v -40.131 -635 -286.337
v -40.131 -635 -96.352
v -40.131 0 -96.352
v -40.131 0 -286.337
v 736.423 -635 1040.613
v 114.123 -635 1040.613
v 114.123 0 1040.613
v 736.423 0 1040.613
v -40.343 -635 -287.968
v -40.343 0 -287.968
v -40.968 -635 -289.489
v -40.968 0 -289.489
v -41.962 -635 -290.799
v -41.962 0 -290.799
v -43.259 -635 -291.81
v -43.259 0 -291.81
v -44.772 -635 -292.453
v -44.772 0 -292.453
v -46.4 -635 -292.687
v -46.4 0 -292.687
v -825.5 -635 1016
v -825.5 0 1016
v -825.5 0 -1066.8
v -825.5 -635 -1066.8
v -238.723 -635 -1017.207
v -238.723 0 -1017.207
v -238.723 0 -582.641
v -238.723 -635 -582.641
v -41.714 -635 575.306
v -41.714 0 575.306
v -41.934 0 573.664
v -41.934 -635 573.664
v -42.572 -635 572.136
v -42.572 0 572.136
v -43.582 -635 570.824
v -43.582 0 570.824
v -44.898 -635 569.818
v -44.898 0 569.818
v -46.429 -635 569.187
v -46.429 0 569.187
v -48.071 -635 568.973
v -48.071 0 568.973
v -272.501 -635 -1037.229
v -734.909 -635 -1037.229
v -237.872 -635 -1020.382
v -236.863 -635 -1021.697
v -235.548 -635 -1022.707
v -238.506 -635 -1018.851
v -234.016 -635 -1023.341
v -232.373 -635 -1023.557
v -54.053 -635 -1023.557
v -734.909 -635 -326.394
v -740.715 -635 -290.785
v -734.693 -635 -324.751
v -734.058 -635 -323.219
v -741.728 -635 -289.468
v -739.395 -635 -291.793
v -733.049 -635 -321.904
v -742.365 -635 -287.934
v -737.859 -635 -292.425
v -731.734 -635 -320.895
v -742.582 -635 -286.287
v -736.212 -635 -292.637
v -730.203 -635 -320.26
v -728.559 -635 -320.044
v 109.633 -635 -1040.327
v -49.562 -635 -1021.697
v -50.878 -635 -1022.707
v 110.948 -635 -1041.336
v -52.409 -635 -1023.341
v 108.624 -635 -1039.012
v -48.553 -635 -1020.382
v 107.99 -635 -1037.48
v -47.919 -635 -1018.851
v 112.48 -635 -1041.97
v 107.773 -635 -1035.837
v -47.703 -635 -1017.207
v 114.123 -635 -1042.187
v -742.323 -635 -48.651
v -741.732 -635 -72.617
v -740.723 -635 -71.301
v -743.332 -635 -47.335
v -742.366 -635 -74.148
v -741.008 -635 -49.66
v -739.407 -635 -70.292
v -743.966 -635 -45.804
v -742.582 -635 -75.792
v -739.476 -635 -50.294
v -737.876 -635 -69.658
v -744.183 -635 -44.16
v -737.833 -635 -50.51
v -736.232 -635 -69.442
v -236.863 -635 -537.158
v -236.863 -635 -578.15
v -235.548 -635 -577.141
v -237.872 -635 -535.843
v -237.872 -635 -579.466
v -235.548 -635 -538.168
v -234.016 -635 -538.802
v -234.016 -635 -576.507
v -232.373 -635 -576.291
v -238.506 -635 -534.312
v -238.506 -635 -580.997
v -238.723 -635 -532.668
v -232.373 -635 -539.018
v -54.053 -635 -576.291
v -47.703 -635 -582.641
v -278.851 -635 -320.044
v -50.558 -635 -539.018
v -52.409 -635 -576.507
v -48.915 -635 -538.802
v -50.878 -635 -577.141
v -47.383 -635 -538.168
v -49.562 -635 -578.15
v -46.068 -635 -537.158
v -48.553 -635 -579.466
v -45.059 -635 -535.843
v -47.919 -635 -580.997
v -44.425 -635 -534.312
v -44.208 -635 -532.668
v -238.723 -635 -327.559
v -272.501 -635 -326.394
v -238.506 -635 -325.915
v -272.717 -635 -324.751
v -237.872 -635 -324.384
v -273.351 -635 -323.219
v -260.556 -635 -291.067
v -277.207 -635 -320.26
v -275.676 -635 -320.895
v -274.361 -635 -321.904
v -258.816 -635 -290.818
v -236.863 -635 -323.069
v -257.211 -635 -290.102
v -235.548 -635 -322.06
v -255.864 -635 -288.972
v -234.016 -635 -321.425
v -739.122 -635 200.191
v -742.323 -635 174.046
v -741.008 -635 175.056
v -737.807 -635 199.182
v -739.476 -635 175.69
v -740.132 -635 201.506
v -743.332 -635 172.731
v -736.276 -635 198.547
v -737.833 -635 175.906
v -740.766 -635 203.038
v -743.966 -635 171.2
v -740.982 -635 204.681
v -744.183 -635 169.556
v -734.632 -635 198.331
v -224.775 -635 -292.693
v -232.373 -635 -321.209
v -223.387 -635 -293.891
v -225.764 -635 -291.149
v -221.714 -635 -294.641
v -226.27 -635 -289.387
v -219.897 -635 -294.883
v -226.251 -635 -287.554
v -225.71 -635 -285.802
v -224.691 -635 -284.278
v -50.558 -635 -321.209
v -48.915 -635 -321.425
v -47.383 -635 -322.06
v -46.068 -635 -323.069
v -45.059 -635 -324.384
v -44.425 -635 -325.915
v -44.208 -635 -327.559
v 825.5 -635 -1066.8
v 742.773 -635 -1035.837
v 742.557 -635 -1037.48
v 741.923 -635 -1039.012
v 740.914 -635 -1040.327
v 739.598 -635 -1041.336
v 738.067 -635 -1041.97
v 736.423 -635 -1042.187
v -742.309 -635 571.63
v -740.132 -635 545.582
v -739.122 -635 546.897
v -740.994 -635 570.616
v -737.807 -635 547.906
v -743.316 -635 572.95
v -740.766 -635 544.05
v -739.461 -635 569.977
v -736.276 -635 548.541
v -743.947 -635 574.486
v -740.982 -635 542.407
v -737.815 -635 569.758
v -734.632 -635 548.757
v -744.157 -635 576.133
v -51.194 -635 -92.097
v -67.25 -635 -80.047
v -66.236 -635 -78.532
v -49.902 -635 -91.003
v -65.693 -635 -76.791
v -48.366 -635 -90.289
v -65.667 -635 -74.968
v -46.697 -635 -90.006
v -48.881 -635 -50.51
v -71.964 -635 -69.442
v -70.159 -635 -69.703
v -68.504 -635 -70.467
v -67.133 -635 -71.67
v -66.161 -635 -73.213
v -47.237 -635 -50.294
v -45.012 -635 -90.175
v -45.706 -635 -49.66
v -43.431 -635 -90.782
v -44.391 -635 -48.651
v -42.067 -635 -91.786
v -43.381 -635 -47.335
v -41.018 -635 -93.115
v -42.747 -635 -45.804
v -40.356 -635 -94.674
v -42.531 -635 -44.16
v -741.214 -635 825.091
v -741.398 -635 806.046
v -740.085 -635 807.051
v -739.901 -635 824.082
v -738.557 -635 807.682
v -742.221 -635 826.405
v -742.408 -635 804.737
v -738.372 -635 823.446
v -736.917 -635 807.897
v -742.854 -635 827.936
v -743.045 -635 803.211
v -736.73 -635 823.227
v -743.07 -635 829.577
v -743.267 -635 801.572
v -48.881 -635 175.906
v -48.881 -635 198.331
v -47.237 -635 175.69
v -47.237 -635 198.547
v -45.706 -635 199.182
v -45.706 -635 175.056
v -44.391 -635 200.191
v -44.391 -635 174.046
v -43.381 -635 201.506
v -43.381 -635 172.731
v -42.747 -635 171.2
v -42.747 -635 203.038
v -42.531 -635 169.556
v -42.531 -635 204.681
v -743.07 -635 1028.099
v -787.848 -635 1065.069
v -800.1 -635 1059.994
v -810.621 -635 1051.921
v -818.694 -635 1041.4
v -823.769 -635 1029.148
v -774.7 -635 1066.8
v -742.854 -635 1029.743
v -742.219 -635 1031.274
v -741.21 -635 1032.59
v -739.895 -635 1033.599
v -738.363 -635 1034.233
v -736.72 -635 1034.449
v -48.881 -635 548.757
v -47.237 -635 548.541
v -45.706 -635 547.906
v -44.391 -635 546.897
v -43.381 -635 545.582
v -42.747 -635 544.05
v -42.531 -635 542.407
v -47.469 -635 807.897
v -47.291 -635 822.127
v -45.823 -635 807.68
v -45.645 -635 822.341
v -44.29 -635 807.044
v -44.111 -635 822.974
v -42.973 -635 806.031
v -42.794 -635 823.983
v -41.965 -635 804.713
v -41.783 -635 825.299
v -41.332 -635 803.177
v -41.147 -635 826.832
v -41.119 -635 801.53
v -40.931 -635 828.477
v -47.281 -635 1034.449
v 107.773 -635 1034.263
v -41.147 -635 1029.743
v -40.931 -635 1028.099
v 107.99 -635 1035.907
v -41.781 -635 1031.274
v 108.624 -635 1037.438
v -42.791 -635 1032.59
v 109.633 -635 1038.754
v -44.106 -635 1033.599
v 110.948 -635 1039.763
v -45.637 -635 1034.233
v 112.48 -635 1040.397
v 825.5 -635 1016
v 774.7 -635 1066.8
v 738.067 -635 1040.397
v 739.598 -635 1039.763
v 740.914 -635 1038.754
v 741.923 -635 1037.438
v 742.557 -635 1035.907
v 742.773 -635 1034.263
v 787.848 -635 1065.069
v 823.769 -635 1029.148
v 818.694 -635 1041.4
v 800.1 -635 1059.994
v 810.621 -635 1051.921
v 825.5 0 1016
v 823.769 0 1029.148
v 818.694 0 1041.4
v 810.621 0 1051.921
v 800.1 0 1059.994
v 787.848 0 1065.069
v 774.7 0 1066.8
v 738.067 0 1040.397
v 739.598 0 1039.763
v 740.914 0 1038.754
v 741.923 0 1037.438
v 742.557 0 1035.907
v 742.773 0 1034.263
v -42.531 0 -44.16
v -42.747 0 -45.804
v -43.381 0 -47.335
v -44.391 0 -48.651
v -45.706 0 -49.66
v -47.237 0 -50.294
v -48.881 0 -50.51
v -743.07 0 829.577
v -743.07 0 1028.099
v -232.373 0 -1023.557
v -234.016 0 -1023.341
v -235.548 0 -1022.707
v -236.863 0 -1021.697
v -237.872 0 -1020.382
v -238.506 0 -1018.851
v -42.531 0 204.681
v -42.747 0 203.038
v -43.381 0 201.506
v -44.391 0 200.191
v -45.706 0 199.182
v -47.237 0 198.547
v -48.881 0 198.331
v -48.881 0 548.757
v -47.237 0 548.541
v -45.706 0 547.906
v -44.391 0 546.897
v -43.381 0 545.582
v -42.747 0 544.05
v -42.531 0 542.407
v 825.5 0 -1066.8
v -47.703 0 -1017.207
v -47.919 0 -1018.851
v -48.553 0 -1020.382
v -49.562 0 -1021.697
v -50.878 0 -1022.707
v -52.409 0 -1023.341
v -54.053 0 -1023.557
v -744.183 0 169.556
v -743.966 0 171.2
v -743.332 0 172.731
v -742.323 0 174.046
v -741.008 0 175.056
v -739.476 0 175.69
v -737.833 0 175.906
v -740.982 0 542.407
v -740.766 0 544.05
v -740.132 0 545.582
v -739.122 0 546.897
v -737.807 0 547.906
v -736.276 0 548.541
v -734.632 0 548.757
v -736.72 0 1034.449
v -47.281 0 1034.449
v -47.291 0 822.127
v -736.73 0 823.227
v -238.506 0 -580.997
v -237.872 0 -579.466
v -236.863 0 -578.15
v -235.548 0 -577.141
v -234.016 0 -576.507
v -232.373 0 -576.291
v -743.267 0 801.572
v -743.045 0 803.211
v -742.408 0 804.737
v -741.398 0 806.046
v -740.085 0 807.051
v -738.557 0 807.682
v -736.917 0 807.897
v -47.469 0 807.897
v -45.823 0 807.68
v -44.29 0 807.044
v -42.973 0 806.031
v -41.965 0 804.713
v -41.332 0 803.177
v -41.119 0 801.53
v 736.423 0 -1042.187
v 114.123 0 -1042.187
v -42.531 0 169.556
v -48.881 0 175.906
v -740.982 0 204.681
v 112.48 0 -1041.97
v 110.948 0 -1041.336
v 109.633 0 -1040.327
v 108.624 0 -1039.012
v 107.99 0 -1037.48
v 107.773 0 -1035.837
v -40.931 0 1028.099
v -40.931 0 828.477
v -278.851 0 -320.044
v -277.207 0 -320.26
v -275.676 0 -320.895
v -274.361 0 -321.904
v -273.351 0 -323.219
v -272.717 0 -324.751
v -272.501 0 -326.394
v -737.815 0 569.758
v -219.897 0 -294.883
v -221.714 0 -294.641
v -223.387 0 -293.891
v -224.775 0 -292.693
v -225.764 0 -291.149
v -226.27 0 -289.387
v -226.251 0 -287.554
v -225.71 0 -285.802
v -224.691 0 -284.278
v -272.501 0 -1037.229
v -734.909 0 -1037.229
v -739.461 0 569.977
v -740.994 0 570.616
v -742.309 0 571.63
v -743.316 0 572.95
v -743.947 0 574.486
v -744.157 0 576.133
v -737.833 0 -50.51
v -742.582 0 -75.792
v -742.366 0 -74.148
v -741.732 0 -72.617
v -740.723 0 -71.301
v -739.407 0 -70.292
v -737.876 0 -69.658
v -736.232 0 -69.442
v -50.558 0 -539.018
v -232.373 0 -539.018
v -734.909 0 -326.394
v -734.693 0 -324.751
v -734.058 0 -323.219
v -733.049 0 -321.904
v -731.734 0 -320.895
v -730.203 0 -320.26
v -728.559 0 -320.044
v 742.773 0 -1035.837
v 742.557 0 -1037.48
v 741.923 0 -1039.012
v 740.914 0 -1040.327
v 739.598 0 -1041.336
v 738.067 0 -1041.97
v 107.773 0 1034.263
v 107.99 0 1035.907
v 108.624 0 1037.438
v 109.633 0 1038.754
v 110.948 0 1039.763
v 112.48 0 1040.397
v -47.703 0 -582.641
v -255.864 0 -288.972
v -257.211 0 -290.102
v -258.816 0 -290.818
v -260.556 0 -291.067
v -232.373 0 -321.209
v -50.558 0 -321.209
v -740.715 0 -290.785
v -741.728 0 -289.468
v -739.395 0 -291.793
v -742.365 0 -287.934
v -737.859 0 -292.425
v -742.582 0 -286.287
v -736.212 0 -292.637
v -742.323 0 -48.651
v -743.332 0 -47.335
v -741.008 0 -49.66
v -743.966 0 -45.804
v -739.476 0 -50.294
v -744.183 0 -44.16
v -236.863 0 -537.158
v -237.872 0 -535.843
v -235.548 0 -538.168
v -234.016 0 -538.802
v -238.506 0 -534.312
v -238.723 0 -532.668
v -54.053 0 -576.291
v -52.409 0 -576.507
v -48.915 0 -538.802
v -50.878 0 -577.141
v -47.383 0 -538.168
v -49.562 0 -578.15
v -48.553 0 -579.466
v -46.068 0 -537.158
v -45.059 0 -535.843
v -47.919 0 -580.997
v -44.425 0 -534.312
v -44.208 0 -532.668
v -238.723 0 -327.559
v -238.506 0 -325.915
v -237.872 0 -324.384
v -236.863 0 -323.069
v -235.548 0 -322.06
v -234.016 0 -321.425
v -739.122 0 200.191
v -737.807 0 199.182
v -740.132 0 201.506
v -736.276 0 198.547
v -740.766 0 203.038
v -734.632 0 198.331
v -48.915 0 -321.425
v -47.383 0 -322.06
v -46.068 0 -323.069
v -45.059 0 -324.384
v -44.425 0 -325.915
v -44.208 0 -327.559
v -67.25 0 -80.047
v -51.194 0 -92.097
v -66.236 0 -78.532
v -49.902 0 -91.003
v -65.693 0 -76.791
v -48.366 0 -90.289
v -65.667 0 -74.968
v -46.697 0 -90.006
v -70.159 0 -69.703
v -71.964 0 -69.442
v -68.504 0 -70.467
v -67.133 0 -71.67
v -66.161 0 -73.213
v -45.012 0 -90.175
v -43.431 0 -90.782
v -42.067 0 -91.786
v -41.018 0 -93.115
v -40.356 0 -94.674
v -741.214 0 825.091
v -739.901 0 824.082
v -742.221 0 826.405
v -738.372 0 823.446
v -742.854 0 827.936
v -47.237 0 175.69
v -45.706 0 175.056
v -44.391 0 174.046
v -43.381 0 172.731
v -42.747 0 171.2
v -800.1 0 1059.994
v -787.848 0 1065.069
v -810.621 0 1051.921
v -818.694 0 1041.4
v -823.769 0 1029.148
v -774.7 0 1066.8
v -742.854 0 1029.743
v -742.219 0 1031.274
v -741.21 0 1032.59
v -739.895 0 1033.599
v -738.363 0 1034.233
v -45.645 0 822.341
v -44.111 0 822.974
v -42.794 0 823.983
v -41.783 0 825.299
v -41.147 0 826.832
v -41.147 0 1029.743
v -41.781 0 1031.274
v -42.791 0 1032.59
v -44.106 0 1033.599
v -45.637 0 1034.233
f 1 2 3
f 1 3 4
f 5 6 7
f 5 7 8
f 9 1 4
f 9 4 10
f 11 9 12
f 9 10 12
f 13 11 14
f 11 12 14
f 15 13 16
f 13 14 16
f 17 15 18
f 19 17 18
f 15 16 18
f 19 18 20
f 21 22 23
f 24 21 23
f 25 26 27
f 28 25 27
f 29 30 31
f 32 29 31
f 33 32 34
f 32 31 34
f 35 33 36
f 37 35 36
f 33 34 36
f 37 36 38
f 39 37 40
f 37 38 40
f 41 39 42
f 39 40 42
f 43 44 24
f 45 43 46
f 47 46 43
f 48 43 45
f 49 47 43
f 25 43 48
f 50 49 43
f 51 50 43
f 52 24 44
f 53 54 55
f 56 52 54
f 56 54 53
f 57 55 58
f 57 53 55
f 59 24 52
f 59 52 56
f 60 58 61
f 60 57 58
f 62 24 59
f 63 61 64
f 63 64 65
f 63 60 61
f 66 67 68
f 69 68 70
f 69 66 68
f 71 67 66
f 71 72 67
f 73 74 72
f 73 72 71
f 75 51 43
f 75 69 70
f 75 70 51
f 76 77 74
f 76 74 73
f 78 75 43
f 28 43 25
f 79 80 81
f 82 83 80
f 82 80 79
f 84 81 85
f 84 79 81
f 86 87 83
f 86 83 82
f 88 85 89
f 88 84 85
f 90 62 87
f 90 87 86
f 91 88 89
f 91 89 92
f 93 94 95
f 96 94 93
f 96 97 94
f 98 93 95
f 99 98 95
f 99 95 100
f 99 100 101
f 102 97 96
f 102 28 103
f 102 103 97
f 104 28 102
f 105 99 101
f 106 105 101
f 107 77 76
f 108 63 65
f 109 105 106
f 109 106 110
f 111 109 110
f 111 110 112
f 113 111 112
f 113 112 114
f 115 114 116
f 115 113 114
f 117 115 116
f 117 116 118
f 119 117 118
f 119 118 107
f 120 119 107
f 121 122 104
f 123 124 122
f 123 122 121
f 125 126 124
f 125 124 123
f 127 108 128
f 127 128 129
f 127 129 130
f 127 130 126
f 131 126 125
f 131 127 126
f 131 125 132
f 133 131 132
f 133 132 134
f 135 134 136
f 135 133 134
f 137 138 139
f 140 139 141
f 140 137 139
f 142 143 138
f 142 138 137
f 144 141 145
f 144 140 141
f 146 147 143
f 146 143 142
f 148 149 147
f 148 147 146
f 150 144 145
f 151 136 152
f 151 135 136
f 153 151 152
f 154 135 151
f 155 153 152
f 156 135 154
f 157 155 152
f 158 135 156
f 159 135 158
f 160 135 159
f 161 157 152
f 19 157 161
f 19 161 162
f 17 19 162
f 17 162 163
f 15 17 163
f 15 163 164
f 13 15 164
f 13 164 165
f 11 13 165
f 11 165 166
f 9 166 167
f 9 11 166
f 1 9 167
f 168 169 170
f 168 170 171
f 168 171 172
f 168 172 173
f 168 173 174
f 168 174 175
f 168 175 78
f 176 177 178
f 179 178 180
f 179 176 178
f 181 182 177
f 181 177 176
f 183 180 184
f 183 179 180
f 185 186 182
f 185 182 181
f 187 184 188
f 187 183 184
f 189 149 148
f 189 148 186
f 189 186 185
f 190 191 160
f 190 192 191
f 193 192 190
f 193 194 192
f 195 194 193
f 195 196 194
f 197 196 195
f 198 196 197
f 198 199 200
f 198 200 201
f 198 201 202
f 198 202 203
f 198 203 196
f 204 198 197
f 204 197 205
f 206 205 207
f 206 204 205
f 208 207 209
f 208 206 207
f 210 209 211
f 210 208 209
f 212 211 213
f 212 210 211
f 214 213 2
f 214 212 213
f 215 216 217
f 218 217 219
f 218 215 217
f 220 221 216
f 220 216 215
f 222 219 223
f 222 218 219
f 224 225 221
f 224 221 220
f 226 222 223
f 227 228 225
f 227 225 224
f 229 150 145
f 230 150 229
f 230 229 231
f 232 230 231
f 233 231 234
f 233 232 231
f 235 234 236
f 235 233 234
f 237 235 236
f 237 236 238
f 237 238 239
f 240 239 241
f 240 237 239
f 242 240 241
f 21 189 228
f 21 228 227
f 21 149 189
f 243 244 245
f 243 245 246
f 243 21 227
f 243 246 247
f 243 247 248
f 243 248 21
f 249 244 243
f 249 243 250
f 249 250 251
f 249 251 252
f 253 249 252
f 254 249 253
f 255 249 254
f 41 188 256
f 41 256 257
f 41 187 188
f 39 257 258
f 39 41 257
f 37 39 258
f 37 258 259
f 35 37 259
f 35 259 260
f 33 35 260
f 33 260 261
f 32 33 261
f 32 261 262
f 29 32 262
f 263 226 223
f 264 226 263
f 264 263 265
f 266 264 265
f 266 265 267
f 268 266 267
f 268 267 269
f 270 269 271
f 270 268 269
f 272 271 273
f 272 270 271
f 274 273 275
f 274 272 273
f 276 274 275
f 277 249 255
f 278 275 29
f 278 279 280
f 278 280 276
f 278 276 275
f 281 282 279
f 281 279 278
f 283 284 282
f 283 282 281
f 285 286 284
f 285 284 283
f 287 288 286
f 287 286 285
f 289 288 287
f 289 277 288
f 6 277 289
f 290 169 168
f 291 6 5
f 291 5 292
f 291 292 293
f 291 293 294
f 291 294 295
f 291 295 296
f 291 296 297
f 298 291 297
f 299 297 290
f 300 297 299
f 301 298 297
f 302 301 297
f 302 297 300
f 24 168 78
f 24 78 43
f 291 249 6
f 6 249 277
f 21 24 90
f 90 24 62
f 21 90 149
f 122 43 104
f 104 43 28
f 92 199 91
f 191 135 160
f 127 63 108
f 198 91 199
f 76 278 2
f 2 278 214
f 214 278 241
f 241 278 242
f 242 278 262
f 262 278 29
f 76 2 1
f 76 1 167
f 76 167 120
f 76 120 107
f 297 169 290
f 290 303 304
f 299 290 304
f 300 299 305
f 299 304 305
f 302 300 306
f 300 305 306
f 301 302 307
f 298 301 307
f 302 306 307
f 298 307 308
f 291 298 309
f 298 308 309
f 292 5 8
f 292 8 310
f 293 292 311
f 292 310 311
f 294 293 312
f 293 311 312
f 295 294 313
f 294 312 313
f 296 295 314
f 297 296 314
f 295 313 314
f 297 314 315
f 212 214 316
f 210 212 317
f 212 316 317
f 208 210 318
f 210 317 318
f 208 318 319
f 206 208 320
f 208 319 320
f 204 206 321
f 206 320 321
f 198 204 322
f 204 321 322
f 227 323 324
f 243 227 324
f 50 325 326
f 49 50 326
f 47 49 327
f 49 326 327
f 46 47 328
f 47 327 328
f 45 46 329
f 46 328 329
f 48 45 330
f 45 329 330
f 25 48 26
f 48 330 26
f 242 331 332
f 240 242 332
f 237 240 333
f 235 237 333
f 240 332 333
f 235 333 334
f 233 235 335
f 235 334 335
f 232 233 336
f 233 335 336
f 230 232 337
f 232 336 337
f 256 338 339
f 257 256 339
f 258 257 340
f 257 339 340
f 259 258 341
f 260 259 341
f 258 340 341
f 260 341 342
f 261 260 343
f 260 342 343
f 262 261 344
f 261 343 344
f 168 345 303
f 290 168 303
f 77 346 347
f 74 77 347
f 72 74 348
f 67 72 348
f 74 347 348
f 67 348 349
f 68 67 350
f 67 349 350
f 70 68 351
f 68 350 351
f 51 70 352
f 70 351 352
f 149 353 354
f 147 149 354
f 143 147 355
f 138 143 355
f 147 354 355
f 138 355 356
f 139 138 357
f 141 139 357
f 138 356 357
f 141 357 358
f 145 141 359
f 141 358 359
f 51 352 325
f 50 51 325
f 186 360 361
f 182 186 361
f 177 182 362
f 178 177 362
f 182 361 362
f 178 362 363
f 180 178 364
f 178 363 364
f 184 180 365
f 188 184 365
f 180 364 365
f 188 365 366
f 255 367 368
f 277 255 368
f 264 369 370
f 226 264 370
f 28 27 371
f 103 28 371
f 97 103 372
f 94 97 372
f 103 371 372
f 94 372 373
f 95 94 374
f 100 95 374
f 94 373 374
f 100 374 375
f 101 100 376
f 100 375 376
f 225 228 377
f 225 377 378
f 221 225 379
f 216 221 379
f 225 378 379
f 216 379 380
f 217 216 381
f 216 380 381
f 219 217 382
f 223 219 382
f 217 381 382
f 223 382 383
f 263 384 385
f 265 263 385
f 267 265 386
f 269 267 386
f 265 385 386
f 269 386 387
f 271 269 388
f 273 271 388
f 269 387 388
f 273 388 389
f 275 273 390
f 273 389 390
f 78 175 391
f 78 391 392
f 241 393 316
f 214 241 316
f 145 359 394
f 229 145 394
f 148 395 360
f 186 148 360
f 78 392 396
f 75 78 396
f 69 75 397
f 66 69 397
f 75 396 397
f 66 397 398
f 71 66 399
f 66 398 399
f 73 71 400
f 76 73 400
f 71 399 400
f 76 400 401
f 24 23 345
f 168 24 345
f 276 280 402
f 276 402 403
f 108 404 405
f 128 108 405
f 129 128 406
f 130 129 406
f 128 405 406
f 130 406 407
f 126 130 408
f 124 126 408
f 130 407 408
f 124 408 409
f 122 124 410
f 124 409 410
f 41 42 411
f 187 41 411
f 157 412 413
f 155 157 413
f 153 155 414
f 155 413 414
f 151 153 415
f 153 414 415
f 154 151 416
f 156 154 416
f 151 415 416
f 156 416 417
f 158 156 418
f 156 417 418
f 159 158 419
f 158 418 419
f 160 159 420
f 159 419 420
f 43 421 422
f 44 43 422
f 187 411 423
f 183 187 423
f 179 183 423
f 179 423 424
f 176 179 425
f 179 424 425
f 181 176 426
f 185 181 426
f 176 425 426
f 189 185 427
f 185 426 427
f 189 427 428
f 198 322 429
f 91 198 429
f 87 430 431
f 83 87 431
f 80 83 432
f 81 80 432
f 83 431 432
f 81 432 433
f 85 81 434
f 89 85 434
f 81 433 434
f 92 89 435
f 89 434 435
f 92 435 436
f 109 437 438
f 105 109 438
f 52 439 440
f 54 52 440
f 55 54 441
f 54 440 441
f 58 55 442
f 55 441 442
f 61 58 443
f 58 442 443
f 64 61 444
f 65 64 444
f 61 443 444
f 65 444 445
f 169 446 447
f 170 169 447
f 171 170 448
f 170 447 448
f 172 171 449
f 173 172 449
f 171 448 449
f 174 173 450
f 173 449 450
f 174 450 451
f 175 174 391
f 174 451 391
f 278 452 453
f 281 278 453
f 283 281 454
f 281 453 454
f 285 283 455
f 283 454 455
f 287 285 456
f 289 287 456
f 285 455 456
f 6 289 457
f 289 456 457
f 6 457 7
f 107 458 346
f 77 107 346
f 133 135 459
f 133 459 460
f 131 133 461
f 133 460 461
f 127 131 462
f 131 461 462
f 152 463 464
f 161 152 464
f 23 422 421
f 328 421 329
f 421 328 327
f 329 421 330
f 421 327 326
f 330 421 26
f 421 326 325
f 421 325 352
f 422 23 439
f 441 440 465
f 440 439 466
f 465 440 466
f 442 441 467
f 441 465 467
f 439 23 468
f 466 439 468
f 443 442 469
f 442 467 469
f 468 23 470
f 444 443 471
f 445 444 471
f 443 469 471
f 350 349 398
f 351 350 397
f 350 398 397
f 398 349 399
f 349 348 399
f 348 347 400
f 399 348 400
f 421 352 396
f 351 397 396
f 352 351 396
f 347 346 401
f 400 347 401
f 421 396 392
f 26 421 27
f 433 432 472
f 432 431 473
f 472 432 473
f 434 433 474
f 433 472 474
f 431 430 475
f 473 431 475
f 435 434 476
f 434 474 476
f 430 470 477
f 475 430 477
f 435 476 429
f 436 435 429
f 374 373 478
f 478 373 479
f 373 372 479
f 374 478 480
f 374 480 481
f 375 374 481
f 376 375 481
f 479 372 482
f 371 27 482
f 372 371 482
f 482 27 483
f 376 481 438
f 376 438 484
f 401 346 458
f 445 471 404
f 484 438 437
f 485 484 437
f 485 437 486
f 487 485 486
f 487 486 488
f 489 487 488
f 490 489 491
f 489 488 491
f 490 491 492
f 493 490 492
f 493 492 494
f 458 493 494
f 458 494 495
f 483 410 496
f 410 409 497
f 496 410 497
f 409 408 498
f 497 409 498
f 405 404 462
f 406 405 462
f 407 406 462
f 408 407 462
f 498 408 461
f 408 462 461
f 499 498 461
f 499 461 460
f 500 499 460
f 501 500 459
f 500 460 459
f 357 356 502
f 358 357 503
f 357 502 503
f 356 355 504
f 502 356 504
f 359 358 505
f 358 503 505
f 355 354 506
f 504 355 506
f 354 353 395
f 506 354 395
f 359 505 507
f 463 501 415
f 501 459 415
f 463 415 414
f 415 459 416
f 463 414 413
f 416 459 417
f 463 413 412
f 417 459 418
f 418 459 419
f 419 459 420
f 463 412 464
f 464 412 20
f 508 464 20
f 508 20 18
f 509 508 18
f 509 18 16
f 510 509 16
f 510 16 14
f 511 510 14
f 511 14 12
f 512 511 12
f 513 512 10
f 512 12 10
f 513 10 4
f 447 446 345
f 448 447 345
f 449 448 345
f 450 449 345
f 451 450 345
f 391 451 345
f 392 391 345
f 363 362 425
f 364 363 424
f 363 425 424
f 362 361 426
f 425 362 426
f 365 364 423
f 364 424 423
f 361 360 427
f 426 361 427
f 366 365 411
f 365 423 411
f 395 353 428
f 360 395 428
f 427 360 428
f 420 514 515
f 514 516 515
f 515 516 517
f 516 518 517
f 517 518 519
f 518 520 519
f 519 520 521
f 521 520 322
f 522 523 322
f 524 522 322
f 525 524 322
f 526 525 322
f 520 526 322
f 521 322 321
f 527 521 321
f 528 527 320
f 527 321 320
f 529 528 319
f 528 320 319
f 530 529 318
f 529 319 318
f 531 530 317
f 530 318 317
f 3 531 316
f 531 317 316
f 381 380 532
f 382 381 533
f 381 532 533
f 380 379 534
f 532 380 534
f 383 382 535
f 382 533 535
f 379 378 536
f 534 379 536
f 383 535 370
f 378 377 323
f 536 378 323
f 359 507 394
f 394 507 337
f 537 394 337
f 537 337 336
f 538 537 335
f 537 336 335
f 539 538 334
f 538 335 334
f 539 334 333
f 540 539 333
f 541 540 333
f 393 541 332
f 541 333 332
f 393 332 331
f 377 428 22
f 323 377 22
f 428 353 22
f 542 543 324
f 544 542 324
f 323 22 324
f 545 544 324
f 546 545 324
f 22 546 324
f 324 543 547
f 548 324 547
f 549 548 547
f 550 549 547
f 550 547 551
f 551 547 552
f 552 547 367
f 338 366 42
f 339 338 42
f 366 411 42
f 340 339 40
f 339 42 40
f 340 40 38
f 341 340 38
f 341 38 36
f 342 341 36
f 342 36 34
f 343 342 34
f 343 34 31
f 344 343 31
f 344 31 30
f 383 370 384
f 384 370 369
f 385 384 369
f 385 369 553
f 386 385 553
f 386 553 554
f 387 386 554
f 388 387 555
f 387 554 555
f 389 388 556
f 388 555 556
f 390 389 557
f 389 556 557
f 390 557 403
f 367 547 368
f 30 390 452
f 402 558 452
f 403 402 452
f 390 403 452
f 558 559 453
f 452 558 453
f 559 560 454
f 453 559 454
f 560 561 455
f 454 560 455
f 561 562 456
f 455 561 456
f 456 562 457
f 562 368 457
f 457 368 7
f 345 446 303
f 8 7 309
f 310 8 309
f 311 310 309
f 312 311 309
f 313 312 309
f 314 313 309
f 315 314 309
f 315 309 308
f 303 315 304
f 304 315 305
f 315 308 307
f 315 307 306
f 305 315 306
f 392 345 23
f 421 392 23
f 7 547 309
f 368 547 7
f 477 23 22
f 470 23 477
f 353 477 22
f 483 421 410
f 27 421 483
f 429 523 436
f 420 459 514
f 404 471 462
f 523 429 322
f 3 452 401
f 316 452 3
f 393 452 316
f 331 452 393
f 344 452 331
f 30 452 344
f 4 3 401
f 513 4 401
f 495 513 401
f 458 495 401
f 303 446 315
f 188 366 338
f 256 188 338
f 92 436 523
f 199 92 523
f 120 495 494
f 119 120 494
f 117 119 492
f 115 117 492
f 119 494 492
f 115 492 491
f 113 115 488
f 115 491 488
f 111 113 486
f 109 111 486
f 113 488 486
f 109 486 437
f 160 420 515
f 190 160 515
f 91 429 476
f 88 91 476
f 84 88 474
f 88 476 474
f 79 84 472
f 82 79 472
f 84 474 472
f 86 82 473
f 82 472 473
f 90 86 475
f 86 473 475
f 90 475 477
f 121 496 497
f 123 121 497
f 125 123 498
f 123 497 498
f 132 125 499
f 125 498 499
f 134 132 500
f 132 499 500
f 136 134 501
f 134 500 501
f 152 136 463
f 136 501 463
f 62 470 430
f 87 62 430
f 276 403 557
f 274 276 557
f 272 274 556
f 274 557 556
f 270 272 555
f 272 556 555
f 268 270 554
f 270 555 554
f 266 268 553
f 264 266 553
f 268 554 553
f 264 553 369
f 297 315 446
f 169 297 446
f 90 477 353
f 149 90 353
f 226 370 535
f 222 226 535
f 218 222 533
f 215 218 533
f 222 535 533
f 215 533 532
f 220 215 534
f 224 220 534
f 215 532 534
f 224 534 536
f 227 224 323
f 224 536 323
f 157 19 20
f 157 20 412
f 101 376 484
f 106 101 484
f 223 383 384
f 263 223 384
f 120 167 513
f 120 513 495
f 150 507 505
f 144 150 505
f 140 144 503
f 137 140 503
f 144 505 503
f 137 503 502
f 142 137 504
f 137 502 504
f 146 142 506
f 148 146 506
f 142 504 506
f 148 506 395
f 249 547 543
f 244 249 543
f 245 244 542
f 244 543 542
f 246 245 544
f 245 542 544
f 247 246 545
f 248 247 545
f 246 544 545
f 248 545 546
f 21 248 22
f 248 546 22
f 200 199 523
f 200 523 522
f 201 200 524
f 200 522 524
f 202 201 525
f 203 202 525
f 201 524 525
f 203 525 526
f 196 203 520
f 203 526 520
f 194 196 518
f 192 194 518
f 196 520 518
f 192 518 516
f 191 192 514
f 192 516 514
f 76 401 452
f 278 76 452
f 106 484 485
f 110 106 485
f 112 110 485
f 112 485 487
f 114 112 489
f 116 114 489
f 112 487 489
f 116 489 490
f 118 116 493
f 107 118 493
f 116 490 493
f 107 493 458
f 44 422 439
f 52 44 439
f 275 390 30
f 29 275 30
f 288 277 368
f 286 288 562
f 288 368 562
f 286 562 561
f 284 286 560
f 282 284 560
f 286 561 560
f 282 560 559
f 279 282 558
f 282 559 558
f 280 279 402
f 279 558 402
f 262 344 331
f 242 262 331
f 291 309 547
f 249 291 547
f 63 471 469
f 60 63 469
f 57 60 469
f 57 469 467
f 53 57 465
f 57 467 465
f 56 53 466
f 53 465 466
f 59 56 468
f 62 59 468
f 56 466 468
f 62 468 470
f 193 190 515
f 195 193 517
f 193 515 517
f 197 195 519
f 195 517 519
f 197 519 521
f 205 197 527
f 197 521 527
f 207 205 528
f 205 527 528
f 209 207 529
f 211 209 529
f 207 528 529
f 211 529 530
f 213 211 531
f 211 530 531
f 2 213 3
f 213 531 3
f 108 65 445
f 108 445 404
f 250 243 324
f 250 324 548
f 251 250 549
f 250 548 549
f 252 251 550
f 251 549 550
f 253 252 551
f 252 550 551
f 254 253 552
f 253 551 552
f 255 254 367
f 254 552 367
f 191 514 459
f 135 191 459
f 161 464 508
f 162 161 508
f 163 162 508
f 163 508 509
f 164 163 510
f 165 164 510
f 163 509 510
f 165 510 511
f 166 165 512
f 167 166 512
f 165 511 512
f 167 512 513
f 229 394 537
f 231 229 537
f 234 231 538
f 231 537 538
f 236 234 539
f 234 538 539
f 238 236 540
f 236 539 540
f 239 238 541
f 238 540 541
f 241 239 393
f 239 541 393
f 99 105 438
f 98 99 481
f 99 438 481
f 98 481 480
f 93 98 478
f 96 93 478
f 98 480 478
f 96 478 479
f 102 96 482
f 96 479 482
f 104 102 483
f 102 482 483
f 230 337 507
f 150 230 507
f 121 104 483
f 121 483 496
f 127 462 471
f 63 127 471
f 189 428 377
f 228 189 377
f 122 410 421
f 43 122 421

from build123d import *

# Parameters (mm, degrees)
F0_W     = 219.9670784175
F0_H     = 257.1922540665
F0_H_2   = 477.1593213081
F0_W_2   = 720.8151631057
F0_H_3   = 247.0399104059
F0_H_4   = 372.2520321608
F1_DEPTH = 635


with BuildPart() as f1:
    # F0 (on Front) → F1 (new body)
    with BuildSketch(Plane.XZ):
        with BuildLine():
            Line((-825.5, -1066.8), (825.5, -1066.8))
            Line((825.5, -1066.8), (825.5, 1016))
            ThreePointArc((825.5, 1016), (810.6210244843, 1051.9210244843), (774.7, 1066.8))
            Line((774.7, 1066.8), (-774.7, 1066.8))
            ThreePointArc((-774.7, 1066.8), (-810.6210244843, 1051.9210244843), (-825.5, 1016))
            Line((-825.5, 1016), (-825.5, -1066.8))
        make_face()
        with BuildLine():
            ThreePointArc((107.7734987259, 1034.2634128571), (109.6333706654, 1038.7535409176), (114.1234987259, 1040.6134128571))
            Line((114.1234987259, 1040.6134128571), (736.4234987259, 1040.6134128571))
            ThreePointArc((736.4234987259, 1040.6134128571), (740.9136267864, 1038.7535409176), (742.7734987259, 1034.2634128571))
            Line((742.7734987259, 1034.2634128571), (742.7734987259, -1035.8365871429))
            ThreePointArc((742.7734987259, -1035.8365871429), (740.9136267864, -1040.3267152035), (736.4234987259, -1042.1865871429))
            Line((736.4234987259, -1042.1865871429), (114.1234987259, -1042.1865871429))
            ThreePointArc((114.1234987259, -1042.1865871429), (109.6333706654, -1040.3267152035), (107.7734987259, -1035.8365871429))
            Line((107.7734987259, -1035.8365871429), (107.7734987259, 1034.2634128571))
        make_face(mode=Mode.SUBTRACT)
        Polygon((-787.4, -1037.2292995453), (-787.4, 1045.5707004547), (-752.9641985893, 1045.5707004547), (-32.1490354836, 1045.5707004547), (0, 1045.5707004547), (0, -1037.2292995453), (-32.1490354836, -1037.2292995453), (-252.1161139011, -1037.2292995453), (-272.5006639957, -1037.2292995453), (-734.9091768265, -1037.2292995453), (-752.9641985893, -1037.2292995453), align=None, mode=Mode.SUBTRACT)
        Polygon((-752.9641985893, 1045.5707004547), (-787.4, 1045.5707004547), (-787.4, -1037.2292995453), (-752.9641985893, -1037.2292995453), (-752.9641985893, -302.8777241707), (-752.9641985893, -59.2219047248), (-752.9641985893, 187.818005681), (-752.9641985893, 560.0700378418), (-752.9641985893, 593.9111113548), (-752.9641985893, 780.0370454788), (-752.9641985893, 813.8781785965), (-752.9641985893, 854.4874191284), (-752.9641985893, 1016.9246196747), align=None)
        with BuildLine():
            Line((-752.9641985893, -302.8777241707), (-752.9641985893, -1037.2292995453))
            Line((-752.9641985893, -1037.2292995453), (-734.9091768265, -1037.2292995453))
            Line((-734.9091768265, -1037.2292995453), (-734.9091768265, -326.3940406799))
            ThreePointArc((-734.9091768265, -326.3940406799), (-733.049304887, -321.9039126194), (-728.5591768265, -320.0440406799))
            Line((-728.5591768265, -320.0440406799), (-278.8506639957, -320.0440406799))
            ThreePointArc((-278.8506639957, -320.0440406799), (-274.3605359352, -321.9039126194), (-272.5006639957, -326.3940406799))
            Line((-272.5006639957, -326.3940406799), (-272.5006639957, -1037.2292995453))
            Line((-272.5006639957, -1037.2292995453), (-252.1161139011, -1037.2292995453))
            Line((-252.1161139011, -1037.2292995453), (-252.1161139011, -560.0699782372))
            Line((-252.1161139011, -560.0699782372), (-252.1161139011, -302.8777241707))
            Line((-252.1161139011, -302.8777241707), (-752.9641985893, -302.8777241707))
        make_face()
        with Locations((-142.1325746924, -431.4738512039)):
            Rectangle(F0_W, F0_H)
        with BuildLine():
            ThreePointArc((-238.722667098, -327.5587750435), (-236.8627951586, -323.068646983), (-232.372667098, -321.2087750435))
            Line((-232.372667098, -321.2087750435), (-50.5582434893, -321.2087750435))
            ThreePointArc((-50.5582434893, -321.2087750435), (-46.0681154287, -323.068646983), (-44.2082434893, -327.5587750435))
            Line((-44.2082434893, -327.5587750435), (-44.2082434893, -532.6683329582))
            ThreePointArc((-44.2082434893, -532.6683329582), (-46.0681154287, -537.1584610188), (-50.5582434893, -539.0183329582))
            Line((-50.5582434893, -539.0183329582), (-232.372667098, -539.0183329582))
            ThreePointArc((-232.372667098, -539.0183329582), (-236.8627951586, -537.1584610188), (-238.722667098, -532.6683329582))
            Line((-238.722667098, -532.6683329582), (-238.722667098, -327.5587750435))
        make_face(mode=Mode.SUBTRACT)
        with Locations((-142.1325746924, -798.6496388912)):
            Rectangle(F0_W, F0_H_2)
        with BuildLine():
            ThreePointArc((-238.722667098, -582.6405478477), (-236.8627951586, -578.1504197872), (-232.372667098, -576.2905478477))
            Line((-232.372667098, -576.2905478477), (-54.0525136352, -576.2905478477))
            ThreePointArc((-54.0525136352, -576.2905478477), (-49.5623855746, -578.1504197872), (-47.7025136352, -582.6405478477))
            Line((-47.7025136352, -582.6405478477), (-47.7025136352, -1017.207305336))
            ThreePointArc((-47.7025136352, -1017.207305336), (-49.5623855746, -1021.6974333965), (-54.0525136352, -1023.557305336))
            Line((-54.0525136352, -1023.557305336), (-232.372667098, -1023.557305336))
            ThreePointArc((-232.372667098, -1023.557305336), (-236.8627951586, -1021.6974333965), (-238.722667098, -1017.207305336))
            Line((-238.722667098, -1017.207305336), (-238.722667098, -582.6405478477))
        make_face(mode=Mode.SUBTRACT)
        Polygon((-752.9641985893, -59.2219047248), (-752.9641985893, -302.8777241707), (-252.1161139011, -302.8777241707), (-32.1490354836, -59.2219047248), align=None)
        with BuildLine():
            Line((-742.5824999809, -286.2870691341), (-742.5824999809, -75.7915718317))
            ThreePointArc((-742.5824999809, -75.7915718317), (-740.7226280415, -71.3014437712), (-736.2324999809, -69.4415718317))
            Line((-736.2324999809, -69.4415718317), (-71.9638137919, -69.4415718317))
            ThreePointArc((-71.9638137919, -69.4415718317), (-66.1611104022, -73.2125926982), (-67.2504119148, -80.0467266755))
            Line((-67.2504119148, -80.0467266755), (-255.8638893667, -288.972406544))
            ThreePointArc((-255.8638893667, -288.972406544), (-257.9887402532, -290.5156914705), (-260.5563342855, -291.0672171179))
            Line((-260.5563342855, -291.0672171179), (-736.2115430225, -292.6370345518))
            ThreePointArc((-736.2115430225, -292.6370345518), (-740.7152125143, -290.7846004951), (-742.5824999809, -286.2870691341))
        make_face(mode=Mode.SUBTRACT)
        Polygon((-32.1490354836, -59.2219047248), (-252.1161139011, -302.8777241707), (-32.1490354836, -302.8777241707), align=None)
        with BuildLine():
            ThreePointArc((-51.193972408, -92.0971805627), (-44.2010532487, -90.4255908565), (-40.1305705309, -96.3523354064))
            Line((-40.1305705309, -96.3523354064), (-40.1305705309, -286.3372953238))
            ThreePointArc((-40.1305705309, -286.3372953238), (-41.9621154253, -290.7989164932), (-46.4001968172, -292.6867866472))
            Line((-46.4001968172, -292.6867866472), (-219.8970689913, -294.882960675))
            ThreePointArc((-219.8970689913, -294.882960675), (-225.7637081305, -291.149120786), (-224.6908445822, -284.2783145078))
            Line((-224.6908445822, -284.2783145078), (-51.193972408, -92.0971805627))
        make_face(mode=Mode.SUBTRACT)
        with Locations((-392.5566170365, 64.2980504781)):
            Rectangle(F0_W_2, F0_H_3)
        with BuildLine():
            ThreePointArc((-744.1825866699, 169.5563005447), (-742.3227147305, 174.0464286053), (-737.8325866699, 175.9063005447))
            Line((-737.8325866699, 175.9063005447), (-48.8807489932, 175.9063005447))
            ThreePointArc((-48.8807489932, 175.9063005447), (-44.3906209326, 174.0464286053), (-42.5307489932, 169.5563005447))
            Line((-42.5307489932, 169.5563005447), (-42.5307489932, -44.1604325712))
            ThreePointArc((-42.5307489932, -44.1604325712), (-44.3906209326, -48.6505606317), (-48.8807489932, -50.5104325712))
            Line((-48.8807489932, -50.5104325712), (-737.8325866699, -50.5104325712))
            ThreePointArc((-737.8325866699, -50.5104325712), (-742.3227147305, -48.6505606317), (-744.1825866699, -44.1604325712))
            Line((-744.1825866699, -44.1604325712), (-744.1825866699, 169.5563005447))
        make_face(mode=Mode.SUBTRACT)
        with Locations((-392.5566170365, 373.9440217614)):
            Rectangle(F0_W_2, F0_H_4)
        with BuildLine():
            ThreePointArc((-740.9823536873, 542.4069570541), (-739.1224817478, 546.8970851147), (-734.6323536873, 548.7569570541))
            Line((-734.6323536873, 548.7569570541), (-48.8807489932, 548.7569570541))
            ThreePointArc((-48.8807489932, 548.7569570541), (-44.3906209326, 546.8970851147), (-42.5307489932, 542.4069570541))
            Line((-42.5307489932, 542.4069570541), (-42.5307489932, 204.6810580254))
            ThreePointArc((-42.5307489932, 204.6810580254), (-44.3906209326, 200.1909299648), (-48.8807489932, 198.3310580254))
            Line((-48.8807489932, 198.3310580254), (-734.6323536873, 198.3310580254))
            ThreePointArc((-734.6323536873, 198.3310580254), (-739.1224817478, 200.1909299648), (-740.9823536873, 204.6810580254))
            Line((-740.9823536873, 204.6810580254), (-740.9823536873, 542.4069570541))
        make_face(mode=Mode.SUBTRACT)
        Polygon((-32.1490354836, 560.0700378418), (-32.1490354836, 813.8781785965), (-752.9641985893, 813.8781785965), (-752.9641985893, 780.0370454788), (-752.9641985893, 593.9111113548), (-752.9641985893, 560.0700378418), align=None)
        with BuildLine():
            ThreePointArc((-47.4694770129, 807.8971505165), (-42.973452712, 806.0313745838), (-41.1194989413, 801.5304624804))
            Line((-41.1194989413, 801.5304624804), (-41.7140275426, 575.3059049754))
            ThreePointArc((-41.7140275426, 575.3059049754), (-43.582342696, 570.8240157377), (-48.0712380826, 568.9725971303))
            Line((-48.0712380826, 568.9725971303), (-737.8147173414, 569.7581957444))
            ThreePointArc((-737.8147173414, 569.7581957444), (-742.3090228527, 571.6295025522), (-744.1574353417, 576.1332723586))
            Line((-744.1574353417, 576.1332723586), (-743.2670072413, 801.5722312495))
            ThreePointArc((-743.2670072413, 801.5722312495), (-741.3983086815, 806.0461372166), (-736.9170567725, 807.8971505165))
            Line((-736.9170567725, 807.8971505165), (-47.4694770129, 807.8971505165))
        make_face(mode=Mode.SUBTRACT)
        Polygon((0, 1045.5707004547), (-32.1490354836, 1045.5707004547), (-32.1490354836, 813.8781785965), (-32.1490354836, 560.0700378418), (-32.1490354836, 187.818005681), (-32.1490354836, -59.2219047248), (-32.1490354836, -302.8777241707), (-32.1490354836, -560.0699782372), (-32.1490354836, -1037.2292995453), (0, -1037.2292995453), align=None)
        Polygon((-32.1490354836, 1045.5707004547), (-752.9641985893, 1045.5707004547), (-752.9641985893, 1016.9246196747), (-752.9641985893, 854.4874191284), (-752.9641985893, 813.8781785965), (-32.1490354836, 813.8781785965), align=None)
        with BuildLine():
            ThreePointArc((-47.2806287766, 1034.4494581223), (-42.790500716, 1032.5895861828), (-40.9306287766, 1028.0994581223))
            Line((-40.9306287766, 1028.0994581223), (-40.9306287766, 828.4766413002))
            ThreePointArc((-40.9306287766, 828.4766413002), (-42.7940868309, 823.9829299867), (-47.2907677906, 822.1266493947))
            Line((-47.2907677906, 822.1266493947), (-736.7300261753, 823.2274751043))
            ThreePointArc((-736.7300261753, 823.2274751043), (-741.2135984748, 825.0909250641), (-743.0698871613, 829.5774670098))
            Line((-743.0698871613, 829.5774670098), (-743.0698871613, 1028.0994581223))
            ThreePointArc((-743.0698871613, 1028.0994581223), (-741.2100152218, 1032.5895861828), (-736.7198871613, 1034.4494581223))
            Line((-736.7198871613, 1034.4494581223), (-47.2806287766, 1034.4494581223))
        make_face(mode=Mode.SUBTRACT)
    extrude(amount=F1_DEPTH)


solid = f1.part
